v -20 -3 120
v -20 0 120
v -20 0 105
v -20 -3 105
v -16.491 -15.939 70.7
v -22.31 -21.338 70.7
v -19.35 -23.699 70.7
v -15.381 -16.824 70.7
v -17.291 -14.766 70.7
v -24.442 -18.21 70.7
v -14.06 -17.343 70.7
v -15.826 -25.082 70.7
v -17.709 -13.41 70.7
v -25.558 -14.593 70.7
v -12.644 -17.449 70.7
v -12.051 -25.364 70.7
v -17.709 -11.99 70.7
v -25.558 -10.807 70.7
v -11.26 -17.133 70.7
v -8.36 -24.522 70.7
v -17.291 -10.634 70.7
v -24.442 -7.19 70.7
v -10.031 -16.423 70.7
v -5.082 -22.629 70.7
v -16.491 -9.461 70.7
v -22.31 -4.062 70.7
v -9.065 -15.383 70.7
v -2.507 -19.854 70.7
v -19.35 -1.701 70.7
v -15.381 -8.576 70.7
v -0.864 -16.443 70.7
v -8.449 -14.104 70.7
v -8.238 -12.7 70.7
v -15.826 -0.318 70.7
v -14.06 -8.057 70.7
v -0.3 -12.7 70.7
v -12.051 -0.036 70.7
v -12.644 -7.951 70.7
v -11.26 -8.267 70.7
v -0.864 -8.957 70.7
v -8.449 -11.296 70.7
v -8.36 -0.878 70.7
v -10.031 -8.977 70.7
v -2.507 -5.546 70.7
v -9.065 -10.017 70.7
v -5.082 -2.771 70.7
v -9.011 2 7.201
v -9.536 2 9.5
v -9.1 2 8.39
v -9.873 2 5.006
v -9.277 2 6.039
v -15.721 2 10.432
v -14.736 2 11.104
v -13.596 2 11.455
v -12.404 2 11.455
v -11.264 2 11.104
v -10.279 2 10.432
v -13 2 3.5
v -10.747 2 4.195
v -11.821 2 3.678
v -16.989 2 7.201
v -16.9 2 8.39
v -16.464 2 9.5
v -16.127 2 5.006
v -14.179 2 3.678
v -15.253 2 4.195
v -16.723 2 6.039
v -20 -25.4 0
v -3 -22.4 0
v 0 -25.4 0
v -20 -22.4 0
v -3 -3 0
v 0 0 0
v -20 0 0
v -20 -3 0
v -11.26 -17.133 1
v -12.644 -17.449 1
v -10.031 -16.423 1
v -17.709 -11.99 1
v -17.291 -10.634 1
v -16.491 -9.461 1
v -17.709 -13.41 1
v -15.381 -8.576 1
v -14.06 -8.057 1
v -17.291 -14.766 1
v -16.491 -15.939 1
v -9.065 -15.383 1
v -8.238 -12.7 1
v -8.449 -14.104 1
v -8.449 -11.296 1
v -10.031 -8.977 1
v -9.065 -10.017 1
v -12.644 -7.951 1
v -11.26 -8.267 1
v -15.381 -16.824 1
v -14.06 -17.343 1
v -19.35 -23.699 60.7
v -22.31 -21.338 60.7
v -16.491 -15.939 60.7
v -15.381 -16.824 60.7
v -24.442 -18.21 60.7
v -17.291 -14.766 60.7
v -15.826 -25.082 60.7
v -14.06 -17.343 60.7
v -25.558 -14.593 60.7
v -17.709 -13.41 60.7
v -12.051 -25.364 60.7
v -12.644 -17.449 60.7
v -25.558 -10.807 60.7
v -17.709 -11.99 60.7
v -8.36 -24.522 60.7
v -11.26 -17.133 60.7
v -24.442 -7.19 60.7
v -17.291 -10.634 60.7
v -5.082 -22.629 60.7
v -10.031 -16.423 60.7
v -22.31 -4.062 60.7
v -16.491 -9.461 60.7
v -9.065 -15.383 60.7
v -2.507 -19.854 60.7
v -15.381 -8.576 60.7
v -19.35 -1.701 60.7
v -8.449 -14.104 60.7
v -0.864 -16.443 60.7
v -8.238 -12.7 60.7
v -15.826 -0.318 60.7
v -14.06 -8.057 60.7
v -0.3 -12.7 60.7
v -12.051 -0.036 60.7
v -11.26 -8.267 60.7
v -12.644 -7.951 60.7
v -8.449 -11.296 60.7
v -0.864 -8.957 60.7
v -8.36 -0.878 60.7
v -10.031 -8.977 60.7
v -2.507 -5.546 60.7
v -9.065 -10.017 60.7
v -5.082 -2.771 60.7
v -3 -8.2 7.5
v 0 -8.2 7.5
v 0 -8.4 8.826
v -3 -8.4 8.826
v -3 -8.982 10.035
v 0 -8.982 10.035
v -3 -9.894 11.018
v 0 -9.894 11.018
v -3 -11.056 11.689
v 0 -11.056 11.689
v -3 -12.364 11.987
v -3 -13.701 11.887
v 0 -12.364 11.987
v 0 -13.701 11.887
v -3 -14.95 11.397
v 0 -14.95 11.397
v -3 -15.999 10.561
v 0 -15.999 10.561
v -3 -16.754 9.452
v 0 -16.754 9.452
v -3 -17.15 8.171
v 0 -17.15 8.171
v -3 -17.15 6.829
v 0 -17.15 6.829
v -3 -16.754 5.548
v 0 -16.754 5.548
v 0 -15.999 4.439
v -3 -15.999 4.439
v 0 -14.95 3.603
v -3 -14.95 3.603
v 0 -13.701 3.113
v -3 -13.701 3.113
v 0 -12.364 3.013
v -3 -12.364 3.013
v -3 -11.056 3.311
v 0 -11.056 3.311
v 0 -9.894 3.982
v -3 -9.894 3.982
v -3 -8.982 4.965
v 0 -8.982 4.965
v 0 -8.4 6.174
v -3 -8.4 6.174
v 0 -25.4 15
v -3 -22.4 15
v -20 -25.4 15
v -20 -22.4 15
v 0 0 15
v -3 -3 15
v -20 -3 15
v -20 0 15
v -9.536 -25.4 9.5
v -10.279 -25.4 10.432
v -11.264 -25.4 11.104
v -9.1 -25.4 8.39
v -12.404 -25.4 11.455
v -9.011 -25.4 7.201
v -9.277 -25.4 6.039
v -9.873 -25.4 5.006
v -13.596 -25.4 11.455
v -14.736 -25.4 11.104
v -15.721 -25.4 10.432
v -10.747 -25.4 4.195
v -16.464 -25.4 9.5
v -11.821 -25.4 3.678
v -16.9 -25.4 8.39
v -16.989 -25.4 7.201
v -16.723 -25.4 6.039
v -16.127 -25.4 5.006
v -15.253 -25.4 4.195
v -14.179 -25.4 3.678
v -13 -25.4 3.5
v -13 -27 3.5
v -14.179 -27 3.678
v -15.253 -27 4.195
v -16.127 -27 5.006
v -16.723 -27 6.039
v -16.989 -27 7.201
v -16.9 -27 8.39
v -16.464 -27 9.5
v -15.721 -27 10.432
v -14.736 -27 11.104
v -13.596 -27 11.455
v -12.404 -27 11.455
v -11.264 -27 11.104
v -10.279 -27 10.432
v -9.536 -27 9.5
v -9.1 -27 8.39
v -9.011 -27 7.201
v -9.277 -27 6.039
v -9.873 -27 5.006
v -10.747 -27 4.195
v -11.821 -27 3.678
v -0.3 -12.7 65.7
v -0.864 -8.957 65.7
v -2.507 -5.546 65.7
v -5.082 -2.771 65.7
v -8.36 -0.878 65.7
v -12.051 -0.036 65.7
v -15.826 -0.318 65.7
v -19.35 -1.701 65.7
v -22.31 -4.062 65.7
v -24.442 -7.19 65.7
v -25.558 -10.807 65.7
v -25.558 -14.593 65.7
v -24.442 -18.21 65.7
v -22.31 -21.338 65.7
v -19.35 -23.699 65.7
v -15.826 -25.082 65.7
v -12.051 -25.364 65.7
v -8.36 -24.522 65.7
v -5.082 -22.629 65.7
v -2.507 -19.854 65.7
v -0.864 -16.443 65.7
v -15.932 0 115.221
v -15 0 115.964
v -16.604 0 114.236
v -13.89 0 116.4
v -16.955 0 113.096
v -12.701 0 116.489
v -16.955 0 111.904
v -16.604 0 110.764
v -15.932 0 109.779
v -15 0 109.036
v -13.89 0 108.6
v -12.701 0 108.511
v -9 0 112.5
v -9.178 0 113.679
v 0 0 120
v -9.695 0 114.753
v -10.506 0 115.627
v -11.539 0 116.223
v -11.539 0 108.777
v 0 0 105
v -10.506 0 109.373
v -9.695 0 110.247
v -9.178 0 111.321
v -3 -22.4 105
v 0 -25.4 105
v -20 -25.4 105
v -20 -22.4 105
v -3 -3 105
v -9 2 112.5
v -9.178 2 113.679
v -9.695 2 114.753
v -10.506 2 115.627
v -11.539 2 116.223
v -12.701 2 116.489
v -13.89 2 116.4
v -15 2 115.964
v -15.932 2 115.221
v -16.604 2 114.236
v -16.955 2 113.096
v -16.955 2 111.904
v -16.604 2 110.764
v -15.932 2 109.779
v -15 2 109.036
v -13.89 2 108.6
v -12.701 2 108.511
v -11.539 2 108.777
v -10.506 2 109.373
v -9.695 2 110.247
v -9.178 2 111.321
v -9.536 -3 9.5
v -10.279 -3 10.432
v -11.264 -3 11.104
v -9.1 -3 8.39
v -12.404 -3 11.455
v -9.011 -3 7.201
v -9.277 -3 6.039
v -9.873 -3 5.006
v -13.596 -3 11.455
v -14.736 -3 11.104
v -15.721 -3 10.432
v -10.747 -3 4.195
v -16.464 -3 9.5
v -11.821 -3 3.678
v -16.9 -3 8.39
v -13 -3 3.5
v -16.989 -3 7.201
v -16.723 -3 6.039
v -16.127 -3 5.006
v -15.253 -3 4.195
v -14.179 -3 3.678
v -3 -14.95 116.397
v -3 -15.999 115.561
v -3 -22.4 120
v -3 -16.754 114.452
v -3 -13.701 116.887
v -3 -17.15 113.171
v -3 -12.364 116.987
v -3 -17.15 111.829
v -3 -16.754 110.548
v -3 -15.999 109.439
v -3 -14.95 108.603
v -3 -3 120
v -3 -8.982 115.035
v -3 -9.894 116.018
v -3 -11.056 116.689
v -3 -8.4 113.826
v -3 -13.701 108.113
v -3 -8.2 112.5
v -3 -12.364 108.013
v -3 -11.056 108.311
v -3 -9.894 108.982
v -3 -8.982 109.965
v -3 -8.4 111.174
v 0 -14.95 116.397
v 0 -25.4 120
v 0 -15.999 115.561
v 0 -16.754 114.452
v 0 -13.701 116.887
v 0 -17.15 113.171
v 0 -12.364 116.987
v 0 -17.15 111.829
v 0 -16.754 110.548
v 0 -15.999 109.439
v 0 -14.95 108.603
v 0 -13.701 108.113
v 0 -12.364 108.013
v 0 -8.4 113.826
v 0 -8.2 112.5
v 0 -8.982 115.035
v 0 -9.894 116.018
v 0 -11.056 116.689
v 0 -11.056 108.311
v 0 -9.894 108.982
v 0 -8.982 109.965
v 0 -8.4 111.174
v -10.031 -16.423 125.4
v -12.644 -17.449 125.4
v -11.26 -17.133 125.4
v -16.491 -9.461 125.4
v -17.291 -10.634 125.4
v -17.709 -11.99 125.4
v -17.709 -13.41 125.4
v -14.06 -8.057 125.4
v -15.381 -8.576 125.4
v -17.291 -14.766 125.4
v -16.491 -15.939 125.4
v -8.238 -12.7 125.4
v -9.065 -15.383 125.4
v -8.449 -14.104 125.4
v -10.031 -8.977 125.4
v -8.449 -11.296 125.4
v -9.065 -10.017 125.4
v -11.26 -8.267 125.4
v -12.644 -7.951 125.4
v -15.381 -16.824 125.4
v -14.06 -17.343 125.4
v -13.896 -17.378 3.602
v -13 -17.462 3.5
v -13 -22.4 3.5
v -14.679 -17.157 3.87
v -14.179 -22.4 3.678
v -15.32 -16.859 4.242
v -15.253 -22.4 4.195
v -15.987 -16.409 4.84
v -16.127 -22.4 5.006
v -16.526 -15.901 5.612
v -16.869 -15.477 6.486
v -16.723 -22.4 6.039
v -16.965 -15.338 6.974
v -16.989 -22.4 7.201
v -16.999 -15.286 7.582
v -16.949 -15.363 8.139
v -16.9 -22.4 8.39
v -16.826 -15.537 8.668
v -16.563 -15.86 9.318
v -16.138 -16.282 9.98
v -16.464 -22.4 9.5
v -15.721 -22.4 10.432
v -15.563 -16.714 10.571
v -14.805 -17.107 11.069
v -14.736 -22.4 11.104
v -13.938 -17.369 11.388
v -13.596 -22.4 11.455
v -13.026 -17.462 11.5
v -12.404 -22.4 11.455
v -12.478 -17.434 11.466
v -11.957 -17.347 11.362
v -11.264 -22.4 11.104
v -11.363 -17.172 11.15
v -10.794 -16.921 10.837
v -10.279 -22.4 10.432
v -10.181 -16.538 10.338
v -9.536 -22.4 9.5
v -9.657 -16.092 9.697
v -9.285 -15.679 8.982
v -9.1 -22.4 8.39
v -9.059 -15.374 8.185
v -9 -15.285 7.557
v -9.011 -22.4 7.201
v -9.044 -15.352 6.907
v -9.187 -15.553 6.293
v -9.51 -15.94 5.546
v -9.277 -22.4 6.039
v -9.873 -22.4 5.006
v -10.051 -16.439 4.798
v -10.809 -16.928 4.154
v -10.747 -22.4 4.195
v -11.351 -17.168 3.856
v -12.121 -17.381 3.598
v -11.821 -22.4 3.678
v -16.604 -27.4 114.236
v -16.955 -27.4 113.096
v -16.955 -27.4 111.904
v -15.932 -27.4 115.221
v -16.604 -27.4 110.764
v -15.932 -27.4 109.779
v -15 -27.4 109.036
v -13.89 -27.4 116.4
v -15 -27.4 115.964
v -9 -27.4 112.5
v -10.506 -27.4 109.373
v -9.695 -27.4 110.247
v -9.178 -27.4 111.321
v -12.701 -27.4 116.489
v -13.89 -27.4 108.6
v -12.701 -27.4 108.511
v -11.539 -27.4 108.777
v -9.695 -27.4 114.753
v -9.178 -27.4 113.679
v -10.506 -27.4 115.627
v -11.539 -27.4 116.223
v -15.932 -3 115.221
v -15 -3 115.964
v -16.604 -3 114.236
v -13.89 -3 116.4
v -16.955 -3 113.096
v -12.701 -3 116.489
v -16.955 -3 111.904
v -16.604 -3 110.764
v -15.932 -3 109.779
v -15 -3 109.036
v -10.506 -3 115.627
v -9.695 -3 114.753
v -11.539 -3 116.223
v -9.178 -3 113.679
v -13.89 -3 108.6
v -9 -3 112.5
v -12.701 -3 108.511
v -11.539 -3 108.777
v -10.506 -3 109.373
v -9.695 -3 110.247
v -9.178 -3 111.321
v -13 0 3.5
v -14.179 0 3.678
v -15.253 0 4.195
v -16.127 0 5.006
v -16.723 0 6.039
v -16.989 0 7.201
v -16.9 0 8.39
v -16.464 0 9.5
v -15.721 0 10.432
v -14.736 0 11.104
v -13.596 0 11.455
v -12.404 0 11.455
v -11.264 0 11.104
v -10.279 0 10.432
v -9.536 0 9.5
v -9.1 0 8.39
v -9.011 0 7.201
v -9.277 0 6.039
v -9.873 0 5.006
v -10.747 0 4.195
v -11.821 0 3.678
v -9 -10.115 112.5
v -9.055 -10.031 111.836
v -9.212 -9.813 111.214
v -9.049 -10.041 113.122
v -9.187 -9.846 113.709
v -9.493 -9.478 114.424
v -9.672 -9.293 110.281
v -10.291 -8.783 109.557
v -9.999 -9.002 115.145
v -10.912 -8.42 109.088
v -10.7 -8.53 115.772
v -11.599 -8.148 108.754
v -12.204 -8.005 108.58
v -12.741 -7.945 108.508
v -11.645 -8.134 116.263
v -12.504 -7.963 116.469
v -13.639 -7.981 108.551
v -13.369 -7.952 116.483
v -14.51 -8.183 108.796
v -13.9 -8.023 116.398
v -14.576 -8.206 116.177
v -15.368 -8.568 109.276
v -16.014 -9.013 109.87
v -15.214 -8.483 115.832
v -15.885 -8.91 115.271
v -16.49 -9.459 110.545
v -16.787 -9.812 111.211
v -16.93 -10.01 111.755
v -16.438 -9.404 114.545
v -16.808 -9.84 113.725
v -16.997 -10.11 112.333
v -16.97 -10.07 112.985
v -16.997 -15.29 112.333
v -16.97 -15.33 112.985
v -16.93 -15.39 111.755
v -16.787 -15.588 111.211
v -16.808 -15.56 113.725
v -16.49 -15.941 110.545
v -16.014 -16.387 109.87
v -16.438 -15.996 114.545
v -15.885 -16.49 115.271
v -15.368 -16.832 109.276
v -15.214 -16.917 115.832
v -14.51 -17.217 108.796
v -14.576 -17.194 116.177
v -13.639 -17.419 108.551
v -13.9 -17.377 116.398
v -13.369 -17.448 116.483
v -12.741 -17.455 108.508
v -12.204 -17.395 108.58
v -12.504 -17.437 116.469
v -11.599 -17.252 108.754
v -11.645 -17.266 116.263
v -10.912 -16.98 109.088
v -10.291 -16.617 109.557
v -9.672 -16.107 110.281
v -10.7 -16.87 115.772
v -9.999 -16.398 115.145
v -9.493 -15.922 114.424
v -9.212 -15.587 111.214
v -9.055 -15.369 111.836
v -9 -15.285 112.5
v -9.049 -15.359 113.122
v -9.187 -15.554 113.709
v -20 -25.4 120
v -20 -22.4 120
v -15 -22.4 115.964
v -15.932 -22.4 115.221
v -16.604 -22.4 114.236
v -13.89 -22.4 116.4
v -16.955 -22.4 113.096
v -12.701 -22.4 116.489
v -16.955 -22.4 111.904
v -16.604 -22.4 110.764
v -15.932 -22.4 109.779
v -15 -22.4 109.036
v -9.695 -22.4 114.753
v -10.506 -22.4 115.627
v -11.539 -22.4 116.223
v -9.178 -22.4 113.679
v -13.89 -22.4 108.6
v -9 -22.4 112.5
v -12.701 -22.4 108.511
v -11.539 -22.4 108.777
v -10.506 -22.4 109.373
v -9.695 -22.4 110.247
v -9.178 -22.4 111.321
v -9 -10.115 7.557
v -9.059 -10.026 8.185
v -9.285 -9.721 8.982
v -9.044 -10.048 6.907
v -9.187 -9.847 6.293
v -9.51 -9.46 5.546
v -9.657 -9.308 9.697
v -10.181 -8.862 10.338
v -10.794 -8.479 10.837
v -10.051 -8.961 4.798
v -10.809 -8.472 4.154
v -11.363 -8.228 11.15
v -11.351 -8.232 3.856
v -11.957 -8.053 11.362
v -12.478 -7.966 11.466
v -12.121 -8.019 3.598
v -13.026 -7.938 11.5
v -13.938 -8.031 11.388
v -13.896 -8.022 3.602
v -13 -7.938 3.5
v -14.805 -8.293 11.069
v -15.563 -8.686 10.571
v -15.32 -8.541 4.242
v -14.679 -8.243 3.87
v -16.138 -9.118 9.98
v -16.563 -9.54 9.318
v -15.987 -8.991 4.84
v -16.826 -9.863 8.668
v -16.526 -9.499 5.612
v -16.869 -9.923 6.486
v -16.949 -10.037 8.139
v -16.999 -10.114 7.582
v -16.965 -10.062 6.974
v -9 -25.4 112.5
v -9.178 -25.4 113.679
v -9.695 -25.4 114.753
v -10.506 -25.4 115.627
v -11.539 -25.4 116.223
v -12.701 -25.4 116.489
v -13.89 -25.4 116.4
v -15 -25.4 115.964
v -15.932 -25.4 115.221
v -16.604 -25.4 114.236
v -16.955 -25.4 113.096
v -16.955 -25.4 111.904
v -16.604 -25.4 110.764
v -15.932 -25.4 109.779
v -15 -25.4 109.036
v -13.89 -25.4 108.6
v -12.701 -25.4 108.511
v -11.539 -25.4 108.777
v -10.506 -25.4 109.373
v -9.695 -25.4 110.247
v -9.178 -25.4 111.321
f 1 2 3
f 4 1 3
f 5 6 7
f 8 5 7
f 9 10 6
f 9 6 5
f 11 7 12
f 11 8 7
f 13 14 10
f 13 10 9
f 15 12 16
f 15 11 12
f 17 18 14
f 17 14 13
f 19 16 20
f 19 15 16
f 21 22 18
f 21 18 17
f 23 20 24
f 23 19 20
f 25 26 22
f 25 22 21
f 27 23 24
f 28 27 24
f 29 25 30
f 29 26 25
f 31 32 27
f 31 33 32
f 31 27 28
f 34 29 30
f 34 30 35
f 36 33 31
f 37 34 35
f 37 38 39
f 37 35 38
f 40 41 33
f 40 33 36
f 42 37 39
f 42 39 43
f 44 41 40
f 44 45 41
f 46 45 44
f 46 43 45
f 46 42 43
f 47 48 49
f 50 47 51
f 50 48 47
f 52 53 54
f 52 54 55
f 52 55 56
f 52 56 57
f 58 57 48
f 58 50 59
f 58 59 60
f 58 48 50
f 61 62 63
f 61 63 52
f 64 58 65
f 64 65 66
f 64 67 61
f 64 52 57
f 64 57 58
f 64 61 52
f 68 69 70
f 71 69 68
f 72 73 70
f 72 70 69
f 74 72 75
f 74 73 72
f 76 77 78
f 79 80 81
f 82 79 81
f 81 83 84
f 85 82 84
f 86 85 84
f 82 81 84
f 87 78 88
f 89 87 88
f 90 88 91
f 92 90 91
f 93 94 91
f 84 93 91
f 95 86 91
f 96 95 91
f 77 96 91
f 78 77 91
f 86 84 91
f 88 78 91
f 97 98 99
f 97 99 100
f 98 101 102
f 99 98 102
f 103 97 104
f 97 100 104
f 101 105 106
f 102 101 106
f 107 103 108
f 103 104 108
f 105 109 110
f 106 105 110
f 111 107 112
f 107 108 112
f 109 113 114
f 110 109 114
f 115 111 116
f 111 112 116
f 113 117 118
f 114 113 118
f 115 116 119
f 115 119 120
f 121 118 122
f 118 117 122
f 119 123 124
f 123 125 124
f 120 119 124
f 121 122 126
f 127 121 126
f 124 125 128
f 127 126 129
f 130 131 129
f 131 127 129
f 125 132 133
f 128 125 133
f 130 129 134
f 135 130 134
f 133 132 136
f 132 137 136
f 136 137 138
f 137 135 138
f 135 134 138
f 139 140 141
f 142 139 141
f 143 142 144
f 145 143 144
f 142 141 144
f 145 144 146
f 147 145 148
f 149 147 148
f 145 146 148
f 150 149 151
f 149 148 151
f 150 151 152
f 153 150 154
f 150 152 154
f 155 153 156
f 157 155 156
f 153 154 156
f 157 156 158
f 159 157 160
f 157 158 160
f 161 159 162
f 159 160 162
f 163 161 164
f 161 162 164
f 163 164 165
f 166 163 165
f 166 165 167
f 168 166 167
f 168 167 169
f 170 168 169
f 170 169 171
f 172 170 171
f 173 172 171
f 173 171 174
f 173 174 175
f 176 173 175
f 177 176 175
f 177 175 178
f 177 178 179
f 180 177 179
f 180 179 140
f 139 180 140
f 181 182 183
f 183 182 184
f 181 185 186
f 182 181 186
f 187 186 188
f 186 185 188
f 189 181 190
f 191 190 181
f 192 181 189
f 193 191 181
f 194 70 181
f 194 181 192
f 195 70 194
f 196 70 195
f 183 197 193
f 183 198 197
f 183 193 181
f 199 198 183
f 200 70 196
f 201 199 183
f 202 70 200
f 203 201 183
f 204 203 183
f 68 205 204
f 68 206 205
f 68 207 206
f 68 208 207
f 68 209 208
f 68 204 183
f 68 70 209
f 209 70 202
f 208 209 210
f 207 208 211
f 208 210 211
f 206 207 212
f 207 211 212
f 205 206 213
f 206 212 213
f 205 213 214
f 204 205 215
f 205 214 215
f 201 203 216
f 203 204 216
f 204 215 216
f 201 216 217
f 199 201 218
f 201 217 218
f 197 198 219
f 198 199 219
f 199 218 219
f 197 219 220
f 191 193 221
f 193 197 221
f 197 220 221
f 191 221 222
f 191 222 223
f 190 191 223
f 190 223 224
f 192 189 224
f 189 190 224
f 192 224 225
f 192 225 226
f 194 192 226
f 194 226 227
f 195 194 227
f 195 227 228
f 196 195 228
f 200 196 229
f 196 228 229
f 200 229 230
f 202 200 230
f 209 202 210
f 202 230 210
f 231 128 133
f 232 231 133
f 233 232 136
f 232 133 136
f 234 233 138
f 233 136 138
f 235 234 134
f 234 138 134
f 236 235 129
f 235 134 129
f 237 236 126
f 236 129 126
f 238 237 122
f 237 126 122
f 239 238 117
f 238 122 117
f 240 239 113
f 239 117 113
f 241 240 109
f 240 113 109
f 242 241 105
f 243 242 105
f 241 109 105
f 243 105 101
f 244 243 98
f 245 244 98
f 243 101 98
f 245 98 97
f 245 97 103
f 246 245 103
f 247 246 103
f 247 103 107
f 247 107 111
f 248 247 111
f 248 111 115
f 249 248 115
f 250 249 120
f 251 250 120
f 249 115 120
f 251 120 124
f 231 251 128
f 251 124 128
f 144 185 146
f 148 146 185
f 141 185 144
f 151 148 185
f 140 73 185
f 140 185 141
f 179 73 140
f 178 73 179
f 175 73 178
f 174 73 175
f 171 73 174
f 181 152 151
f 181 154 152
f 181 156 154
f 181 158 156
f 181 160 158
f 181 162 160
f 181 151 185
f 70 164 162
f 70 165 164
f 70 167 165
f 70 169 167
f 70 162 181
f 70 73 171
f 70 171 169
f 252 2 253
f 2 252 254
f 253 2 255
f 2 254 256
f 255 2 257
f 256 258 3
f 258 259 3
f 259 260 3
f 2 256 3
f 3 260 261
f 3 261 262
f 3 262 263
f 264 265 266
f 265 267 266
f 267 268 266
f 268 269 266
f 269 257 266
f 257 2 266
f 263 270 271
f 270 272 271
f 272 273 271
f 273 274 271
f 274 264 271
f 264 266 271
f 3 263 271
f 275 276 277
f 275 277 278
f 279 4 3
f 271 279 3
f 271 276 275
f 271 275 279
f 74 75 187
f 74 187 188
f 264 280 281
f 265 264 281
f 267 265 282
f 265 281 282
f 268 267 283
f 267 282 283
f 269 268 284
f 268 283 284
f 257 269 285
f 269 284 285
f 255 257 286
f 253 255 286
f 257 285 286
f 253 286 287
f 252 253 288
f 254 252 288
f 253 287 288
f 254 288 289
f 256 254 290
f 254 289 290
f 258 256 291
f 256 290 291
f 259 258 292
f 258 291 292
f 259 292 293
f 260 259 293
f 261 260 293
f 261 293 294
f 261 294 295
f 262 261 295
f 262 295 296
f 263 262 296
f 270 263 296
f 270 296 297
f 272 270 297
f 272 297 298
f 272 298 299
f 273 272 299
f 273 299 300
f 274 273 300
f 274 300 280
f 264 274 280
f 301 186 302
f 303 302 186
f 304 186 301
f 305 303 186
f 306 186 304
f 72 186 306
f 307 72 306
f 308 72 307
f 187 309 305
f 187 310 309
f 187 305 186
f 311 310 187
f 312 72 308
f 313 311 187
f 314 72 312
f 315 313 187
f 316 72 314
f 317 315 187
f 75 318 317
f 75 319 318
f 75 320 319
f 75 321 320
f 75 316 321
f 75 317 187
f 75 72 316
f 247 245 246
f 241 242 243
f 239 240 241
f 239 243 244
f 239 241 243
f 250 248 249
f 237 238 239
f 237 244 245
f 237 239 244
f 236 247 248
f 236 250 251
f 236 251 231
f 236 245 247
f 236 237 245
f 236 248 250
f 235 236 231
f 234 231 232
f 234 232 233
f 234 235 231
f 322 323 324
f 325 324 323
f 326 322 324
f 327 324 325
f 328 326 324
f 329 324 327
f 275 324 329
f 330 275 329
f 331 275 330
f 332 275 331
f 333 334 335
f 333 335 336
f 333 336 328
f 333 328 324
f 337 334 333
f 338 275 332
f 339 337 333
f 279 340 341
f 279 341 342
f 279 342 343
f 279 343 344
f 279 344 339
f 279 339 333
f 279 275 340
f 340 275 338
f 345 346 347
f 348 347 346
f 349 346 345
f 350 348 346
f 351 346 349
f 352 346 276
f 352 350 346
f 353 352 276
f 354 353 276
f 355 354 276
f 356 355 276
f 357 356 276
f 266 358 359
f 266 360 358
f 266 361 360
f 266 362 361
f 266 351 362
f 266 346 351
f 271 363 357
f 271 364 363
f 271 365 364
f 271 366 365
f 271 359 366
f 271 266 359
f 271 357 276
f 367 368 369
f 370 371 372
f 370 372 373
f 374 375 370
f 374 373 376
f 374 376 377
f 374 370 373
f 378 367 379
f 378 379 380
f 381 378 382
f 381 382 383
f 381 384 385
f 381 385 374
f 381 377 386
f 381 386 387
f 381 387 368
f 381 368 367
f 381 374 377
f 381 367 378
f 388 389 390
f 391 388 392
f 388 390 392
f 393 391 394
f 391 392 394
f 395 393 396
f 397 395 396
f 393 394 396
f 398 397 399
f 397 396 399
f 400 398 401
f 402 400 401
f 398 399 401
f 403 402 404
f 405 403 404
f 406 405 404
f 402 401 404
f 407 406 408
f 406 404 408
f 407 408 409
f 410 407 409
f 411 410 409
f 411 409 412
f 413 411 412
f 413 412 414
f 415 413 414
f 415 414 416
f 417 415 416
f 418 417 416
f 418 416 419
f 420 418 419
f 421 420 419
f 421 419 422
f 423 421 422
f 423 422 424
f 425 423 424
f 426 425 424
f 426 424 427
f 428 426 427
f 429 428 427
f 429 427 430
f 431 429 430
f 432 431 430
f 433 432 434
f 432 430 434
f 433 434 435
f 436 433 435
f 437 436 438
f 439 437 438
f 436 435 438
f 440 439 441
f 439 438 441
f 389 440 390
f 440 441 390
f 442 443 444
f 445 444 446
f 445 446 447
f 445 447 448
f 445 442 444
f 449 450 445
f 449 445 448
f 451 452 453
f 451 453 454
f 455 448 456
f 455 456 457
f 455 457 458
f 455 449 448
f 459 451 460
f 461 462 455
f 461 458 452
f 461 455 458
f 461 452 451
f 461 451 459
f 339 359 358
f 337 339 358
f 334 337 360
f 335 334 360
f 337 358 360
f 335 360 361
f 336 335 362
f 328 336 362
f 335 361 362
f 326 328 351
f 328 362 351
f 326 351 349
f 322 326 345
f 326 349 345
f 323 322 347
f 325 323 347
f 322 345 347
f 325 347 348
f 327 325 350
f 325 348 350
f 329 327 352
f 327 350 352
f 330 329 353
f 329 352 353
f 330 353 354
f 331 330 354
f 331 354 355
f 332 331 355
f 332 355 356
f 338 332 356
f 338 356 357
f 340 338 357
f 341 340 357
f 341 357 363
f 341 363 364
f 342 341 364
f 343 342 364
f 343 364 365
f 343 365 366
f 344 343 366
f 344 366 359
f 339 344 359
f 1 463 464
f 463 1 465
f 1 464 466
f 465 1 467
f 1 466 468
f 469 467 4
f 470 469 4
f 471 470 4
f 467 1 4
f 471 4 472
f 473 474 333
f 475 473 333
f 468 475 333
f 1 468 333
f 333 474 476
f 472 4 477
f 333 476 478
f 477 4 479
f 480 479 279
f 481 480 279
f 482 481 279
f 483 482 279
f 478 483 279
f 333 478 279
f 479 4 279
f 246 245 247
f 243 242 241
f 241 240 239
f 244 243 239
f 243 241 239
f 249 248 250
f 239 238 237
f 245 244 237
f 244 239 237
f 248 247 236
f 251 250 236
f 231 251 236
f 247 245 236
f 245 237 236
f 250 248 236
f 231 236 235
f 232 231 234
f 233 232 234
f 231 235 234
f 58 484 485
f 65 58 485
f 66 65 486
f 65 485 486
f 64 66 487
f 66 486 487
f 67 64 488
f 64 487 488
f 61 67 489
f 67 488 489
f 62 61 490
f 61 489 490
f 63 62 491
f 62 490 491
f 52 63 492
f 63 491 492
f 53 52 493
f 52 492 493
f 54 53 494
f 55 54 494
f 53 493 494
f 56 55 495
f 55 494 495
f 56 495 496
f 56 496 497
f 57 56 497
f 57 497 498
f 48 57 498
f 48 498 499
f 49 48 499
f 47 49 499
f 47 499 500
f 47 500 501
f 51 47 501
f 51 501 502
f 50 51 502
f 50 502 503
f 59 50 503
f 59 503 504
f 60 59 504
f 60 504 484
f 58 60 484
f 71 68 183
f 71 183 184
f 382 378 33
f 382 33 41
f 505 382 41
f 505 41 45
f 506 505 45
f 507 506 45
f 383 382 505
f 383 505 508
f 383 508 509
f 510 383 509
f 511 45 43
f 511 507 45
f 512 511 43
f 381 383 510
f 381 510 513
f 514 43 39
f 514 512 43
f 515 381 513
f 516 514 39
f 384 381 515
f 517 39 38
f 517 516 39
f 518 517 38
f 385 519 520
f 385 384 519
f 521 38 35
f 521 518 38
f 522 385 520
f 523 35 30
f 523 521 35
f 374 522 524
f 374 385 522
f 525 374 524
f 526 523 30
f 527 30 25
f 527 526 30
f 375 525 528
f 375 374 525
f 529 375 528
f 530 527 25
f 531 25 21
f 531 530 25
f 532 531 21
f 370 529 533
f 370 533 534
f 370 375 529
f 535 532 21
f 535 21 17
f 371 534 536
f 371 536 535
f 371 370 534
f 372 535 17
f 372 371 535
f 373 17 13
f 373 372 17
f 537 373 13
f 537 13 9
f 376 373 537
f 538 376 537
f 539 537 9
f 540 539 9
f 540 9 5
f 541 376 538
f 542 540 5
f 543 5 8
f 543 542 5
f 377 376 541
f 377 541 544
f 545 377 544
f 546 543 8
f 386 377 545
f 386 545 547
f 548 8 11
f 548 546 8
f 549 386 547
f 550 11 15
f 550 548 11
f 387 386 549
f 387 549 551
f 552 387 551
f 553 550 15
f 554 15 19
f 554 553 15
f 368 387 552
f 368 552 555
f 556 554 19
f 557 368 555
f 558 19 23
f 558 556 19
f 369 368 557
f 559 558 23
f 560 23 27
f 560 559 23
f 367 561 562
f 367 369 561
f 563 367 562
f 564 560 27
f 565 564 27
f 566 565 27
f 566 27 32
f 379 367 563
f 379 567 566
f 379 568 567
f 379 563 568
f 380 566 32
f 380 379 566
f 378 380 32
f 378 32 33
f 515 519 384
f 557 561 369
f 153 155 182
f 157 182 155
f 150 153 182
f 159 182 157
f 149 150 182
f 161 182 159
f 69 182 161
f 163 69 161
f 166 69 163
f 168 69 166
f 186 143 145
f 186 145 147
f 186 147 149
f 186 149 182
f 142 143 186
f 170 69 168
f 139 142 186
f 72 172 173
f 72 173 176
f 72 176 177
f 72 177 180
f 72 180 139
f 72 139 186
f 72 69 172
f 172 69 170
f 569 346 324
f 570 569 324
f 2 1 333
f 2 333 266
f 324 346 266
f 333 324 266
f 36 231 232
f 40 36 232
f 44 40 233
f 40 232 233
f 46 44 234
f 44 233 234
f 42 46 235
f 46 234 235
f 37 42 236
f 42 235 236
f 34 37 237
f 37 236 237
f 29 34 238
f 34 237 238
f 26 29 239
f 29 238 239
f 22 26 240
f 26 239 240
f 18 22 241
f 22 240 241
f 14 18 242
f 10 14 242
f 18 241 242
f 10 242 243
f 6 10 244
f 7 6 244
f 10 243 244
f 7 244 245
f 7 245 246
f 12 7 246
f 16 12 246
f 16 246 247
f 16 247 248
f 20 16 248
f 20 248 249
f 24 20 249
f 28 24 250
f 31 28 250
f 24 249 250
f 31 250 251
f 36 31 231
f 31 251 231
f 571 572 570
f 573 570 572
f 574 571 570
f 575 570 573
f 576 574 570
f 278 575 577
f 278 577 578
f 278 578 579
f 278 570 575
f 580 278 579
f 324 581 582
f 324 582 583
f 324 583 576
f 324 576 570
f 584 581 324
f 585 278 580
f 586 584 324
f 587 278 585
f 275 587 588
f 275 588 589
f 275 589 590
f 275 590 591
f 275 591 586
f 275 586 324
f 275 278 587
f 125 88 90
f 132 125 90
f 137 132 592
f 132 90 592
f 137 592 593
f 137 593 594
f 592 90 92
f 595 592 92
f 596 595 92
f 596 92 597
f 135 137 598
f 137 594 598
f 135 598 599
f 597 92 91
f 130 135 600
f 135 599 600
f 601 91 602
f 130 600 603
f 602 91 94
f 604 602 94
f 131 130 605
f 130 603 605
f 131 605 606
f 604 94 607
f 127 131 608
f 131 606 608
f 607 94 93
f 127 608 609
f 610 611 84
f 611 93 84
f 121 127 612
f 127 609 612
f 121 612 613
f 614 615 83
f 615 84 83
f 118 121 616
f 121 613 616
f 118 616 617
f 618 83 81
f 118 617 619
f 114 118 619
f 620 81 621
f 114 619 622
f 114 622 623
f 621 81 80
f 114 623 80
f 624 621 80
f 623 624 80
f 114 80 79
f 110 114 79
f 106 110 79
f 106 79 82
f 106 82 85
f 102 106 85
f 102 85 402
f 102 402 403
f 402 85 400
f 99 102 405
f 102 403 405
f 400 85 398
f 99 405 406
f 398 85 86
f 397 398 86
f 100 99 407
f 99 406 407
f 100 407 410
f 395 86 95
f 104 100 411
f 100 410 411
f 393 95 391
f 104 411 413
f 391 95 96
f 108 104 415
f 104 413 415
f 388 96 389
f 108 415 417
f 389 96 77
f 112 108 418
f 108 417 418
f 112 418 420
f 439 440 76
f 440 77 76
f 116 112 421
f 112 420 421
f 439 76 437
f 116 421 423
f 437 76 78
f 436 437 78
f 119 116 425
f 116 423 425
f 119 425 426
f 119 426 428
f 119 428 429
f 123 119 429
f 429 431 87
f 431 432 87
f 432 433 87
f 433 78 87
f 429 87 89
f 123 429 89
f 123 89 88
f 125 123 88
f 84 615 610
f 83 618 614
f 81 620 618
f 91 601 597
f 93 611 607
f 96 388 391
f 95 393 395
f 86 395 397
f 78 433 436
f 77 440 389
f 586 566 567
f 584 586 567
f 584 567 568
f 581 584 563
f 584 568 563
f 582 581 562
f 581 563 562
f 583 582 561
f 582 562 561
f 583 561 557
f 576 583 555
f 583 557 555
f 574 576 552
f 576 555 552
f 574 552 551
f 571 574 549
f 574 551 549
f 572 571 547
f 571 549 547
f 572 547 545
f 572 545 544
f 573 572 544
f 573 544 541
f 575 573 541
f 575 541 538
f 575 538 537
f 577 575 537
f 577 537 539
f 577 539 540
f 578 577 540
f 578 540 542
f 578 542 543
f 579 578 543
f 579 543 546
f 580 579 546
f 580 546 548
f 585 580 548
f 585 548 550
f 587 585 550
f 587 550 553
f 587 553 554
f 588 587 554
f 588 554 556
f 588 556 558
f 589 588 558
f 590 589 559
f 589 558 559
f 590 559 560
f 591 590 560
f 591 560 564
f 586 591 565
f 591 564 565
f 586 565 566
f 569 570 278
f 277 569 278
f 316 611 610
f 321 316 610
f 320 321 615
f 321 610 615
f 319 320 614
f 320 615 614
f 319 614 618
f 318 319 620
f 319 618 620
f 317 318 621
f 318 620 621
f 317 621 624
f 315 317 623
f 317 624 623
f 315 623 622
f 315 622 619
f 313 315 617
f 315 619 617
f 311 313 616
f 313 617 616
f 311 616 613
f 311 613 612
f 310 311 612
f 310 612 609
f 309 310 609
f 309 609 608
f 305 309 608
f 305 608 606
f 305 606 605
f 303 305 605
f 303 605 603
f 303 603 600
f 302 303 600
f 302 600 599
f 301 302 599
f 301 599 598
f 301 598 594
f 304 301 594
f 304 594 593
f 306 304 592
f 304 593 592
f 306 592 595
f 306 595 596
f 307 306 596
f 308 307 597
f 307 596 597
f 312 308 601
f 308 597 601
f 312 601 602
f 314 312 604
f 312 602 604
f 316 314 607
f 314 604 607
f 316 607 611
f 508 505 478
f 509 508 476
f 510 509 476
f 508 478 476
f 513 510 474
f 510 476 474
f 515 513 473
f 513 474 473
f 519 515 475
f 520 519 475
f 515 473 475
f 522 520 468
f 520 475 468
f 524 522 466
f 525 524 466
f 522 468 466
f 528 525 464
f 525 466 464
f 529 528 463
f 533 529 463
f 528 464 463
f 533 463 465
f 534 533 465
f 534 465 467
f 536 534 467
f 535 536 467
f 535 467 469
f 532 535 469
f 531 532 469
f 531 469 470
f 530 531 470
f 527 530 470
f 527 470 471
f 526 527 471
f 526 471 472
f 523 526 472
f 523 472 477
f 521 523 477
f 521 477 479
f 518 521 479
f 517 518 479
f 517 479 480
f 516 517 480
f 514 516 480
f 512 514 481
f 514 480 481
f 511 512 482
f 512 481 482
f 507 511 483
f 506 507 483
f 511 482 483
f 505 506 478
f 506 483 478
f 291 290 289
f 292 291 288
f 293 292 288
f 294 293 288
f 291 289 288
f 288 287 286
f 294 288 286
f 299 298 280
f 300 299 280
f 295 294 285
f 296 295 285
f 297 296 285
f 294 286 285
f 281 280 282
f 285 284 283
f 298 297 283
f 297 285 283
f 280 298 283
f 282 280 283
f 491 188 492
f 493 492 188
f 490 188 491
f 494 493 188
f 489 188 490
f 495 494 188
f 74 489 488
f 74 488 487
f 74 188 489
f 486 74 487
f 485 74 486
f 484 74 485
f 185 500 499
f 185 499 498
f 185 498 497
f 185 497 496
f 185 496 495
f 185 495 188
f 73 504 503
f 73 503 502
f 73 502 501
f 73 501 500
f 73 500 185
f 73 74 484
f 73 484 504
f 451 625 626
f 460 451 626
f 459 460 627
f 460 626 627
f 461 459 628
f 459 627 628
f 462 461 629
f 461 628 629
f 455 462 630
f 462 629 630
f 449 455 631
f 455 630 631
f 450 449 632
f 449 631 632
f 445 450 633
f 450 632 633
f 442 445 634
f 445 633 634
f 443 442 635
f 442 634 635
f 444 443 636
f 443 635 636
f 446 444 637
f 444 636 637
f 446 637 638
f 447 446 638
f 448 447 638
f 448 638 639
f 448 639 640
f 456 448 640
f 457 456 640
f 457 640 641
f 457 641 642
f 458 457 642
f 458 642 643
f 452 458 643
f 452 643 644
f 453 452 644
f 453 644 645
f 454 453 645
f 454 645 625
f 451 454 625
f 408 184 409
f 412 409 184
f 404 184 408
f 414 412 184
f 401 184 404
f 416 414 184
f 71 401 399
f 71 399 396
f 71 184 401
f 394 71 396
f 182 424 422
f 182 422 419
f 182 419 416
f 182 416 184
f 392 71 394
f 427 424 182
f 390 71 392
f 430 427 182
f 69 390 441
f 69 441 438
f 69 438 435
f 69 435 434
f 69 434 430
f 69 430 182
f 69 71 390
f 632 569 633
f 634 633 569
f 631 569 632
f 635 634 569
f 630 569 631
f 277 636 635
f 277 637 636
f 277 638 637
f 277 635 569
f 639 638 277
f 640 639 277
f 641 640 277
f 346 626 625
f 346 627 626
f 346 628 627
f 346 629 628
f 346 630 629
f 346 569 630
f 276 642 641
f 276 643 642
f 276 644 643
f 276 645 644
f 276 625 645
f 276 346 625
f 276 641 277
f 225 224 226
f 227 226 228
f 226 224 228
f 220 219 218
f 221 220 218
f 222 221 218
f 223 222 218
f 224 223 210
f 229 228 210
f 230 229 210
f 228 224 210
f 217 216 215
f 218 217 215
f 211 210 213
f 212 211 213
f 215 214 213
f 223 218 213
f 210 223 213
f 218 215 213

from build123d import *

# Parameters (mm, degrees)
BOSS_EXTRUDE1_DEPTH       = 15
SKETCH2_R                 = 4.5
CUT_EXTRUDE1_DEPTH        = 15
SKETCH3_R                 = 4
CUT_EXTRUDE2_DEPTH        = 36.639304146
BOSS_EXTRUDE2_DEPTH       = 2
BOSS_EXTRUDE2_DEPTH_BACK  = 27
SKETCH4_R                 = 4
SKETCH5_R                 = 2.5
CUT_EXTRUDE3_DEPTH        = 27
BOSS_EXTRUDE3_DEPTH       = 45.7
BOSS_EXTRUDE3_DEPTH_BACK  = 14
SKETCH6_R                 = 4.7625
SKETCH7_W                 = 15
SKETCH7_H                 = 25.4
BOSS_EXTRUDE4_DEPTH       = 20
SKETCH13_R                = 12.7
BOSS_EXTRUDE7_DEPTH       = 5
SKETCH16_R                = 12.7
BOSS_EXTRUDE8_DEPTH       = 5
SKETCH17_R                = 2.5
CUT_EXTRUDE6_DEPTH        = 54.7
BOSS_EXTRUDE9_START       = 54.7
SKETCH18_R                = 4.7625
BOSS_EXTRUDE9_DEPTH       = 54.7
CUT_EXTRUDE7_DEPTH        = 126.65623741
CUT_EXTRUDE7_DEPTH_BACK   = 20
SKETCH19_W                = 17
SKETCH19_H                = 19.4
SKETCH19_R                = 4.7625
SKETCH10_R                = 4
CUT_EXTRUDE8_DEPTH        = 131.906111393
BOSS_EXTRUDE10_DEPTH      = 2
BOSS_EXTRUDE10_DEPTH_BACK = 27.4
SKETCH20_R                = 4
SKETCH21_R                = 4.5
CUT_EXTRUDE9_DEPTH        = 8


with BuildPart() as part:
    # Sketch1 → Boss-Extrude1 (new body)
    with BuildSketch(Plane.XY):
        Polygon((0, 0), (0, -25.4), (-20, -25.4), (-20, -22.4), (-3, -22.4), (-3, -3), (-20, -3), (-20, 0), align=None)
    extrude(amount=BOSS_EXTRUDE1_DEPTH)

    # Sketch2 → Cut-Extrude1 (cut)
    with BuildSketch(Plane(origin=(0, 0, 0), x_dir=(0, 0, -1), z_dir=(1, 0, 0))):
        with Locations(Location((-7.5, -12.7, 0), (0, 0, 90))):
            Circle(SKETCH2_R)
    extrude(amount=-CUT_EXTRUDE1_DEPTH, mode=Mode.SUBTRACT)

    # Sketch3 → Cut-Extrude2 (cut, through all)
    with BuildSketch(Plane.XZ.offset(25.4)):
        with Locations(Location((-13, 7.5, 0), (0, 0, 270))):
            Circle(SKETCH3_R)
    extrude(amount=-CUT_EXTRUDE2_DEPTH, mode=Mode.SUBTRACT)

    # Sketch4 → Boss-Extrude2 (add, two sides: drawn at the far end of the back side and taken through both)
    with BuildSketch(Plane(origin=(0, 0, 0), x_dir=(1, 0, 0), z_dir=(0, 1, 0)).offset(-BOSS_EXTRUDE2_DEPTH_BACK)):
        with Locations(Location((-13, -7.5, 0), (0, 0, 90))):
            Circle(SKETCH4_R)
    extrude(amount=BOSS_EXTRUDE2_DEPTH + BOSS_EXTRUDE2_DEPTH_BACK)

    # Sketch5 → Cut-Extrude3 (cut)
    with BuildSketch(Plane.XY.offset(15)):
        with Locations((-13, -12.7)):
            Circle(SKETCH5_R)
    extrude(amount=-CUT_EXTRUDE3_DEPTH, mode=Mode.SUBTRACT)

    # Sketch6 → Boss-Extrude3 (add, two sides: drawn at the far end of the back side and taken through both)
    with BuildSketch(Plane.XY.offset(15).offset(-BOSS_EXTRUDE3_DEPTH_BACK)):
        with Locations((-13, -12.7)):
            Circle(SKETCH6_R)
    extrude(amount=BOSS_EXTRUDE3_DEPTH + BOSS_EXTRUDE3_DEPTH_BACK)

    # Sketch13 → Boss-Extrude7 (add)
    with BuildSketch(Plane.XY.offset(60.7)):
        with Locations((-13, -12.7)):
            Circle(SKETCH13_R)
    extrude(amount=BOSS_EXTRUDE7_DEPTH)


with BuildPart() as body_2:
    # Sketch7 → Boss-Extrude4 (new body)
    with BuildSketch(Plane(origin=(0, 0, 0), x_dir=(0, 0, -1), z_dir=(1, 0, 0))):
        with Locations((-112.5, -12.7)):
            Rectangle(SKETCH7_W, SKETCH7_H)
    extrude(amount=-BOSS_EXTRUDE4_DEPTH)

    # Sketch17 → Cut-Extrude6 (cut)
    with BuildSketch(Plane.XY.offset(70.7)):
        with Locations(Location((-13, -12.7, 0), (0, 0, 180))):
            Circle(SKETCH17_R)
    extrude(amount=CUT_EXTRUDE6_DEPTH, mode=Mode.SUBTRACT)



with BuildPart() as body_3:
    # Sketch16 → Boss-Extrude8 (new body)
    with BuildSketch(Plane.XY.offset(65.7)):
        with Locations((-13, -12.7)):
            Circle(SKETCH16_R)
    extrude(amount=BOSS_EXTRUDE8_DEPTH)


with BuildPart() as body_2_1:
    add(body_2.part)

    add(body_3.part)  # Boss-Extrude9 merges body 3
    # Sketch18 → Boss-Extrude9 (add)
    with BuildSketch(Plane.XY.offset(70.7).offset(BOSS_EXTRUDE9_START)):
        with Locations((-13, -12.7)):
            Circle(SKETCH18_R)
    extrude(amount=-BOSS_EXTRUDE9_DEPTH)

    # Sketch19 → Cut-Extrude7 (cut, two sides: drawn at the far end of the back side and taken through both)
    with BuildSketch(Plane.XY.offset(120).offset(-CUT_EXTRUDE7_DEPTH_BACK)):
        with Locations((-11.5, -12.7)):
            Rectangle(SKETCH19_W, SKETCH19_H)
        with Locations((-13, -12.7)):
            Circle(SKETCH19_R, mode=Mode.SUBTRACT)
    extrude(amount=CUT_EXTRUDE7_DEPTH + CUT_EXTRUDE7_DEPTH_BACK, mode=Mode.SUBTRACT)


with BuildPart() as cut_extrude7_piece_1:
    # of the separate pieces the step leaves, piece 1, a body of its own (cut_extrude7_pieces)
    add(body_2_1.part.solids().sort_by_distance((-0.3, -12.7, 65.7))[0])


with BuildPart() as cut_extrude7_piece_2:
    # of the separate pieces the step leaves, piece 2, a body of its own (cut_extrude7_pieces)
    add(body_2_1.part.solids().sort_by_distance((0, 0, 105))[0])


with BuildPart() as cut_extrude8_tool:
    # Sketch10 → Cut-Extrude8 (new, through all)
    with BuildSketch(Plane(origin=(0, -25.4, 0), x_dir=(-1, 0, 0), z_dir=(0, -1, 0))):
        with Locations(Location((13, -112.5, 0), (0, 0, 180))):
            Circle(SKETCH10_R)
    extrude(amount=-CUT_EXTRUDE8_DEPTH)


with BuildPart() as cut_extrude7_piece_1_1:
    add(cut_extrude7_piece_1.part)

    # Cut-Extrude8: cut by cut_extrude8_tool
    add(cut_extrude8_tool.part, mode=Mode.SUBTRACT)



with BuildPart() as cut_extrude7_piece_2_1:
    add(cut_extrude7_piece_2.part)

    # Cut-Extrude8: cut by cut_extrude8_tool
    add(cut_extrude8_tool.part, mode=Mode.SUBTRACT)


with BuildPart() as cut_extrude7_piece_1_2:
    add(cut_extrude7_piece_1_1.part)

    add(cut_extrude7_piece_2_1.part)  # Boss-Extrude10 merges Cut-Extrude7 piece 2
    # Sketch20 → Boss-Extrude10 (add, two sides: drawn at the far end of the back side and taken through both)
    with BuildSketch(Plane.XZ.offset(25.4).offset(-BOSS_EXTRUDE10_DEPTH_BACK)):
        with Locations((-13, 112.5)):
            Circle(SKETCH20_R)
    extrude(amount=BOSS_EXTRUDE10_DEPTH + BOSS_EXTRUDE10_DEPTH_BACK)

    # Sketch21 → Cut-Extrude9 (cut)
    with BuildSketch(Plane(origin=(0, 0, 0), x_dir=(0, 0, -1), z_dir=(1, 0, 0))):
        with Locations(Location((-112.5, -12.7, 0), (0, 0, 90))):
            Circle(SKETCH21_R)
    extrude(amount=-CUT_EXTRUDE9_DEPTH, mode=Mode.SUBTRACT)


solid = Compound([part.part, cut_extrude7_piece_1_2.part])
